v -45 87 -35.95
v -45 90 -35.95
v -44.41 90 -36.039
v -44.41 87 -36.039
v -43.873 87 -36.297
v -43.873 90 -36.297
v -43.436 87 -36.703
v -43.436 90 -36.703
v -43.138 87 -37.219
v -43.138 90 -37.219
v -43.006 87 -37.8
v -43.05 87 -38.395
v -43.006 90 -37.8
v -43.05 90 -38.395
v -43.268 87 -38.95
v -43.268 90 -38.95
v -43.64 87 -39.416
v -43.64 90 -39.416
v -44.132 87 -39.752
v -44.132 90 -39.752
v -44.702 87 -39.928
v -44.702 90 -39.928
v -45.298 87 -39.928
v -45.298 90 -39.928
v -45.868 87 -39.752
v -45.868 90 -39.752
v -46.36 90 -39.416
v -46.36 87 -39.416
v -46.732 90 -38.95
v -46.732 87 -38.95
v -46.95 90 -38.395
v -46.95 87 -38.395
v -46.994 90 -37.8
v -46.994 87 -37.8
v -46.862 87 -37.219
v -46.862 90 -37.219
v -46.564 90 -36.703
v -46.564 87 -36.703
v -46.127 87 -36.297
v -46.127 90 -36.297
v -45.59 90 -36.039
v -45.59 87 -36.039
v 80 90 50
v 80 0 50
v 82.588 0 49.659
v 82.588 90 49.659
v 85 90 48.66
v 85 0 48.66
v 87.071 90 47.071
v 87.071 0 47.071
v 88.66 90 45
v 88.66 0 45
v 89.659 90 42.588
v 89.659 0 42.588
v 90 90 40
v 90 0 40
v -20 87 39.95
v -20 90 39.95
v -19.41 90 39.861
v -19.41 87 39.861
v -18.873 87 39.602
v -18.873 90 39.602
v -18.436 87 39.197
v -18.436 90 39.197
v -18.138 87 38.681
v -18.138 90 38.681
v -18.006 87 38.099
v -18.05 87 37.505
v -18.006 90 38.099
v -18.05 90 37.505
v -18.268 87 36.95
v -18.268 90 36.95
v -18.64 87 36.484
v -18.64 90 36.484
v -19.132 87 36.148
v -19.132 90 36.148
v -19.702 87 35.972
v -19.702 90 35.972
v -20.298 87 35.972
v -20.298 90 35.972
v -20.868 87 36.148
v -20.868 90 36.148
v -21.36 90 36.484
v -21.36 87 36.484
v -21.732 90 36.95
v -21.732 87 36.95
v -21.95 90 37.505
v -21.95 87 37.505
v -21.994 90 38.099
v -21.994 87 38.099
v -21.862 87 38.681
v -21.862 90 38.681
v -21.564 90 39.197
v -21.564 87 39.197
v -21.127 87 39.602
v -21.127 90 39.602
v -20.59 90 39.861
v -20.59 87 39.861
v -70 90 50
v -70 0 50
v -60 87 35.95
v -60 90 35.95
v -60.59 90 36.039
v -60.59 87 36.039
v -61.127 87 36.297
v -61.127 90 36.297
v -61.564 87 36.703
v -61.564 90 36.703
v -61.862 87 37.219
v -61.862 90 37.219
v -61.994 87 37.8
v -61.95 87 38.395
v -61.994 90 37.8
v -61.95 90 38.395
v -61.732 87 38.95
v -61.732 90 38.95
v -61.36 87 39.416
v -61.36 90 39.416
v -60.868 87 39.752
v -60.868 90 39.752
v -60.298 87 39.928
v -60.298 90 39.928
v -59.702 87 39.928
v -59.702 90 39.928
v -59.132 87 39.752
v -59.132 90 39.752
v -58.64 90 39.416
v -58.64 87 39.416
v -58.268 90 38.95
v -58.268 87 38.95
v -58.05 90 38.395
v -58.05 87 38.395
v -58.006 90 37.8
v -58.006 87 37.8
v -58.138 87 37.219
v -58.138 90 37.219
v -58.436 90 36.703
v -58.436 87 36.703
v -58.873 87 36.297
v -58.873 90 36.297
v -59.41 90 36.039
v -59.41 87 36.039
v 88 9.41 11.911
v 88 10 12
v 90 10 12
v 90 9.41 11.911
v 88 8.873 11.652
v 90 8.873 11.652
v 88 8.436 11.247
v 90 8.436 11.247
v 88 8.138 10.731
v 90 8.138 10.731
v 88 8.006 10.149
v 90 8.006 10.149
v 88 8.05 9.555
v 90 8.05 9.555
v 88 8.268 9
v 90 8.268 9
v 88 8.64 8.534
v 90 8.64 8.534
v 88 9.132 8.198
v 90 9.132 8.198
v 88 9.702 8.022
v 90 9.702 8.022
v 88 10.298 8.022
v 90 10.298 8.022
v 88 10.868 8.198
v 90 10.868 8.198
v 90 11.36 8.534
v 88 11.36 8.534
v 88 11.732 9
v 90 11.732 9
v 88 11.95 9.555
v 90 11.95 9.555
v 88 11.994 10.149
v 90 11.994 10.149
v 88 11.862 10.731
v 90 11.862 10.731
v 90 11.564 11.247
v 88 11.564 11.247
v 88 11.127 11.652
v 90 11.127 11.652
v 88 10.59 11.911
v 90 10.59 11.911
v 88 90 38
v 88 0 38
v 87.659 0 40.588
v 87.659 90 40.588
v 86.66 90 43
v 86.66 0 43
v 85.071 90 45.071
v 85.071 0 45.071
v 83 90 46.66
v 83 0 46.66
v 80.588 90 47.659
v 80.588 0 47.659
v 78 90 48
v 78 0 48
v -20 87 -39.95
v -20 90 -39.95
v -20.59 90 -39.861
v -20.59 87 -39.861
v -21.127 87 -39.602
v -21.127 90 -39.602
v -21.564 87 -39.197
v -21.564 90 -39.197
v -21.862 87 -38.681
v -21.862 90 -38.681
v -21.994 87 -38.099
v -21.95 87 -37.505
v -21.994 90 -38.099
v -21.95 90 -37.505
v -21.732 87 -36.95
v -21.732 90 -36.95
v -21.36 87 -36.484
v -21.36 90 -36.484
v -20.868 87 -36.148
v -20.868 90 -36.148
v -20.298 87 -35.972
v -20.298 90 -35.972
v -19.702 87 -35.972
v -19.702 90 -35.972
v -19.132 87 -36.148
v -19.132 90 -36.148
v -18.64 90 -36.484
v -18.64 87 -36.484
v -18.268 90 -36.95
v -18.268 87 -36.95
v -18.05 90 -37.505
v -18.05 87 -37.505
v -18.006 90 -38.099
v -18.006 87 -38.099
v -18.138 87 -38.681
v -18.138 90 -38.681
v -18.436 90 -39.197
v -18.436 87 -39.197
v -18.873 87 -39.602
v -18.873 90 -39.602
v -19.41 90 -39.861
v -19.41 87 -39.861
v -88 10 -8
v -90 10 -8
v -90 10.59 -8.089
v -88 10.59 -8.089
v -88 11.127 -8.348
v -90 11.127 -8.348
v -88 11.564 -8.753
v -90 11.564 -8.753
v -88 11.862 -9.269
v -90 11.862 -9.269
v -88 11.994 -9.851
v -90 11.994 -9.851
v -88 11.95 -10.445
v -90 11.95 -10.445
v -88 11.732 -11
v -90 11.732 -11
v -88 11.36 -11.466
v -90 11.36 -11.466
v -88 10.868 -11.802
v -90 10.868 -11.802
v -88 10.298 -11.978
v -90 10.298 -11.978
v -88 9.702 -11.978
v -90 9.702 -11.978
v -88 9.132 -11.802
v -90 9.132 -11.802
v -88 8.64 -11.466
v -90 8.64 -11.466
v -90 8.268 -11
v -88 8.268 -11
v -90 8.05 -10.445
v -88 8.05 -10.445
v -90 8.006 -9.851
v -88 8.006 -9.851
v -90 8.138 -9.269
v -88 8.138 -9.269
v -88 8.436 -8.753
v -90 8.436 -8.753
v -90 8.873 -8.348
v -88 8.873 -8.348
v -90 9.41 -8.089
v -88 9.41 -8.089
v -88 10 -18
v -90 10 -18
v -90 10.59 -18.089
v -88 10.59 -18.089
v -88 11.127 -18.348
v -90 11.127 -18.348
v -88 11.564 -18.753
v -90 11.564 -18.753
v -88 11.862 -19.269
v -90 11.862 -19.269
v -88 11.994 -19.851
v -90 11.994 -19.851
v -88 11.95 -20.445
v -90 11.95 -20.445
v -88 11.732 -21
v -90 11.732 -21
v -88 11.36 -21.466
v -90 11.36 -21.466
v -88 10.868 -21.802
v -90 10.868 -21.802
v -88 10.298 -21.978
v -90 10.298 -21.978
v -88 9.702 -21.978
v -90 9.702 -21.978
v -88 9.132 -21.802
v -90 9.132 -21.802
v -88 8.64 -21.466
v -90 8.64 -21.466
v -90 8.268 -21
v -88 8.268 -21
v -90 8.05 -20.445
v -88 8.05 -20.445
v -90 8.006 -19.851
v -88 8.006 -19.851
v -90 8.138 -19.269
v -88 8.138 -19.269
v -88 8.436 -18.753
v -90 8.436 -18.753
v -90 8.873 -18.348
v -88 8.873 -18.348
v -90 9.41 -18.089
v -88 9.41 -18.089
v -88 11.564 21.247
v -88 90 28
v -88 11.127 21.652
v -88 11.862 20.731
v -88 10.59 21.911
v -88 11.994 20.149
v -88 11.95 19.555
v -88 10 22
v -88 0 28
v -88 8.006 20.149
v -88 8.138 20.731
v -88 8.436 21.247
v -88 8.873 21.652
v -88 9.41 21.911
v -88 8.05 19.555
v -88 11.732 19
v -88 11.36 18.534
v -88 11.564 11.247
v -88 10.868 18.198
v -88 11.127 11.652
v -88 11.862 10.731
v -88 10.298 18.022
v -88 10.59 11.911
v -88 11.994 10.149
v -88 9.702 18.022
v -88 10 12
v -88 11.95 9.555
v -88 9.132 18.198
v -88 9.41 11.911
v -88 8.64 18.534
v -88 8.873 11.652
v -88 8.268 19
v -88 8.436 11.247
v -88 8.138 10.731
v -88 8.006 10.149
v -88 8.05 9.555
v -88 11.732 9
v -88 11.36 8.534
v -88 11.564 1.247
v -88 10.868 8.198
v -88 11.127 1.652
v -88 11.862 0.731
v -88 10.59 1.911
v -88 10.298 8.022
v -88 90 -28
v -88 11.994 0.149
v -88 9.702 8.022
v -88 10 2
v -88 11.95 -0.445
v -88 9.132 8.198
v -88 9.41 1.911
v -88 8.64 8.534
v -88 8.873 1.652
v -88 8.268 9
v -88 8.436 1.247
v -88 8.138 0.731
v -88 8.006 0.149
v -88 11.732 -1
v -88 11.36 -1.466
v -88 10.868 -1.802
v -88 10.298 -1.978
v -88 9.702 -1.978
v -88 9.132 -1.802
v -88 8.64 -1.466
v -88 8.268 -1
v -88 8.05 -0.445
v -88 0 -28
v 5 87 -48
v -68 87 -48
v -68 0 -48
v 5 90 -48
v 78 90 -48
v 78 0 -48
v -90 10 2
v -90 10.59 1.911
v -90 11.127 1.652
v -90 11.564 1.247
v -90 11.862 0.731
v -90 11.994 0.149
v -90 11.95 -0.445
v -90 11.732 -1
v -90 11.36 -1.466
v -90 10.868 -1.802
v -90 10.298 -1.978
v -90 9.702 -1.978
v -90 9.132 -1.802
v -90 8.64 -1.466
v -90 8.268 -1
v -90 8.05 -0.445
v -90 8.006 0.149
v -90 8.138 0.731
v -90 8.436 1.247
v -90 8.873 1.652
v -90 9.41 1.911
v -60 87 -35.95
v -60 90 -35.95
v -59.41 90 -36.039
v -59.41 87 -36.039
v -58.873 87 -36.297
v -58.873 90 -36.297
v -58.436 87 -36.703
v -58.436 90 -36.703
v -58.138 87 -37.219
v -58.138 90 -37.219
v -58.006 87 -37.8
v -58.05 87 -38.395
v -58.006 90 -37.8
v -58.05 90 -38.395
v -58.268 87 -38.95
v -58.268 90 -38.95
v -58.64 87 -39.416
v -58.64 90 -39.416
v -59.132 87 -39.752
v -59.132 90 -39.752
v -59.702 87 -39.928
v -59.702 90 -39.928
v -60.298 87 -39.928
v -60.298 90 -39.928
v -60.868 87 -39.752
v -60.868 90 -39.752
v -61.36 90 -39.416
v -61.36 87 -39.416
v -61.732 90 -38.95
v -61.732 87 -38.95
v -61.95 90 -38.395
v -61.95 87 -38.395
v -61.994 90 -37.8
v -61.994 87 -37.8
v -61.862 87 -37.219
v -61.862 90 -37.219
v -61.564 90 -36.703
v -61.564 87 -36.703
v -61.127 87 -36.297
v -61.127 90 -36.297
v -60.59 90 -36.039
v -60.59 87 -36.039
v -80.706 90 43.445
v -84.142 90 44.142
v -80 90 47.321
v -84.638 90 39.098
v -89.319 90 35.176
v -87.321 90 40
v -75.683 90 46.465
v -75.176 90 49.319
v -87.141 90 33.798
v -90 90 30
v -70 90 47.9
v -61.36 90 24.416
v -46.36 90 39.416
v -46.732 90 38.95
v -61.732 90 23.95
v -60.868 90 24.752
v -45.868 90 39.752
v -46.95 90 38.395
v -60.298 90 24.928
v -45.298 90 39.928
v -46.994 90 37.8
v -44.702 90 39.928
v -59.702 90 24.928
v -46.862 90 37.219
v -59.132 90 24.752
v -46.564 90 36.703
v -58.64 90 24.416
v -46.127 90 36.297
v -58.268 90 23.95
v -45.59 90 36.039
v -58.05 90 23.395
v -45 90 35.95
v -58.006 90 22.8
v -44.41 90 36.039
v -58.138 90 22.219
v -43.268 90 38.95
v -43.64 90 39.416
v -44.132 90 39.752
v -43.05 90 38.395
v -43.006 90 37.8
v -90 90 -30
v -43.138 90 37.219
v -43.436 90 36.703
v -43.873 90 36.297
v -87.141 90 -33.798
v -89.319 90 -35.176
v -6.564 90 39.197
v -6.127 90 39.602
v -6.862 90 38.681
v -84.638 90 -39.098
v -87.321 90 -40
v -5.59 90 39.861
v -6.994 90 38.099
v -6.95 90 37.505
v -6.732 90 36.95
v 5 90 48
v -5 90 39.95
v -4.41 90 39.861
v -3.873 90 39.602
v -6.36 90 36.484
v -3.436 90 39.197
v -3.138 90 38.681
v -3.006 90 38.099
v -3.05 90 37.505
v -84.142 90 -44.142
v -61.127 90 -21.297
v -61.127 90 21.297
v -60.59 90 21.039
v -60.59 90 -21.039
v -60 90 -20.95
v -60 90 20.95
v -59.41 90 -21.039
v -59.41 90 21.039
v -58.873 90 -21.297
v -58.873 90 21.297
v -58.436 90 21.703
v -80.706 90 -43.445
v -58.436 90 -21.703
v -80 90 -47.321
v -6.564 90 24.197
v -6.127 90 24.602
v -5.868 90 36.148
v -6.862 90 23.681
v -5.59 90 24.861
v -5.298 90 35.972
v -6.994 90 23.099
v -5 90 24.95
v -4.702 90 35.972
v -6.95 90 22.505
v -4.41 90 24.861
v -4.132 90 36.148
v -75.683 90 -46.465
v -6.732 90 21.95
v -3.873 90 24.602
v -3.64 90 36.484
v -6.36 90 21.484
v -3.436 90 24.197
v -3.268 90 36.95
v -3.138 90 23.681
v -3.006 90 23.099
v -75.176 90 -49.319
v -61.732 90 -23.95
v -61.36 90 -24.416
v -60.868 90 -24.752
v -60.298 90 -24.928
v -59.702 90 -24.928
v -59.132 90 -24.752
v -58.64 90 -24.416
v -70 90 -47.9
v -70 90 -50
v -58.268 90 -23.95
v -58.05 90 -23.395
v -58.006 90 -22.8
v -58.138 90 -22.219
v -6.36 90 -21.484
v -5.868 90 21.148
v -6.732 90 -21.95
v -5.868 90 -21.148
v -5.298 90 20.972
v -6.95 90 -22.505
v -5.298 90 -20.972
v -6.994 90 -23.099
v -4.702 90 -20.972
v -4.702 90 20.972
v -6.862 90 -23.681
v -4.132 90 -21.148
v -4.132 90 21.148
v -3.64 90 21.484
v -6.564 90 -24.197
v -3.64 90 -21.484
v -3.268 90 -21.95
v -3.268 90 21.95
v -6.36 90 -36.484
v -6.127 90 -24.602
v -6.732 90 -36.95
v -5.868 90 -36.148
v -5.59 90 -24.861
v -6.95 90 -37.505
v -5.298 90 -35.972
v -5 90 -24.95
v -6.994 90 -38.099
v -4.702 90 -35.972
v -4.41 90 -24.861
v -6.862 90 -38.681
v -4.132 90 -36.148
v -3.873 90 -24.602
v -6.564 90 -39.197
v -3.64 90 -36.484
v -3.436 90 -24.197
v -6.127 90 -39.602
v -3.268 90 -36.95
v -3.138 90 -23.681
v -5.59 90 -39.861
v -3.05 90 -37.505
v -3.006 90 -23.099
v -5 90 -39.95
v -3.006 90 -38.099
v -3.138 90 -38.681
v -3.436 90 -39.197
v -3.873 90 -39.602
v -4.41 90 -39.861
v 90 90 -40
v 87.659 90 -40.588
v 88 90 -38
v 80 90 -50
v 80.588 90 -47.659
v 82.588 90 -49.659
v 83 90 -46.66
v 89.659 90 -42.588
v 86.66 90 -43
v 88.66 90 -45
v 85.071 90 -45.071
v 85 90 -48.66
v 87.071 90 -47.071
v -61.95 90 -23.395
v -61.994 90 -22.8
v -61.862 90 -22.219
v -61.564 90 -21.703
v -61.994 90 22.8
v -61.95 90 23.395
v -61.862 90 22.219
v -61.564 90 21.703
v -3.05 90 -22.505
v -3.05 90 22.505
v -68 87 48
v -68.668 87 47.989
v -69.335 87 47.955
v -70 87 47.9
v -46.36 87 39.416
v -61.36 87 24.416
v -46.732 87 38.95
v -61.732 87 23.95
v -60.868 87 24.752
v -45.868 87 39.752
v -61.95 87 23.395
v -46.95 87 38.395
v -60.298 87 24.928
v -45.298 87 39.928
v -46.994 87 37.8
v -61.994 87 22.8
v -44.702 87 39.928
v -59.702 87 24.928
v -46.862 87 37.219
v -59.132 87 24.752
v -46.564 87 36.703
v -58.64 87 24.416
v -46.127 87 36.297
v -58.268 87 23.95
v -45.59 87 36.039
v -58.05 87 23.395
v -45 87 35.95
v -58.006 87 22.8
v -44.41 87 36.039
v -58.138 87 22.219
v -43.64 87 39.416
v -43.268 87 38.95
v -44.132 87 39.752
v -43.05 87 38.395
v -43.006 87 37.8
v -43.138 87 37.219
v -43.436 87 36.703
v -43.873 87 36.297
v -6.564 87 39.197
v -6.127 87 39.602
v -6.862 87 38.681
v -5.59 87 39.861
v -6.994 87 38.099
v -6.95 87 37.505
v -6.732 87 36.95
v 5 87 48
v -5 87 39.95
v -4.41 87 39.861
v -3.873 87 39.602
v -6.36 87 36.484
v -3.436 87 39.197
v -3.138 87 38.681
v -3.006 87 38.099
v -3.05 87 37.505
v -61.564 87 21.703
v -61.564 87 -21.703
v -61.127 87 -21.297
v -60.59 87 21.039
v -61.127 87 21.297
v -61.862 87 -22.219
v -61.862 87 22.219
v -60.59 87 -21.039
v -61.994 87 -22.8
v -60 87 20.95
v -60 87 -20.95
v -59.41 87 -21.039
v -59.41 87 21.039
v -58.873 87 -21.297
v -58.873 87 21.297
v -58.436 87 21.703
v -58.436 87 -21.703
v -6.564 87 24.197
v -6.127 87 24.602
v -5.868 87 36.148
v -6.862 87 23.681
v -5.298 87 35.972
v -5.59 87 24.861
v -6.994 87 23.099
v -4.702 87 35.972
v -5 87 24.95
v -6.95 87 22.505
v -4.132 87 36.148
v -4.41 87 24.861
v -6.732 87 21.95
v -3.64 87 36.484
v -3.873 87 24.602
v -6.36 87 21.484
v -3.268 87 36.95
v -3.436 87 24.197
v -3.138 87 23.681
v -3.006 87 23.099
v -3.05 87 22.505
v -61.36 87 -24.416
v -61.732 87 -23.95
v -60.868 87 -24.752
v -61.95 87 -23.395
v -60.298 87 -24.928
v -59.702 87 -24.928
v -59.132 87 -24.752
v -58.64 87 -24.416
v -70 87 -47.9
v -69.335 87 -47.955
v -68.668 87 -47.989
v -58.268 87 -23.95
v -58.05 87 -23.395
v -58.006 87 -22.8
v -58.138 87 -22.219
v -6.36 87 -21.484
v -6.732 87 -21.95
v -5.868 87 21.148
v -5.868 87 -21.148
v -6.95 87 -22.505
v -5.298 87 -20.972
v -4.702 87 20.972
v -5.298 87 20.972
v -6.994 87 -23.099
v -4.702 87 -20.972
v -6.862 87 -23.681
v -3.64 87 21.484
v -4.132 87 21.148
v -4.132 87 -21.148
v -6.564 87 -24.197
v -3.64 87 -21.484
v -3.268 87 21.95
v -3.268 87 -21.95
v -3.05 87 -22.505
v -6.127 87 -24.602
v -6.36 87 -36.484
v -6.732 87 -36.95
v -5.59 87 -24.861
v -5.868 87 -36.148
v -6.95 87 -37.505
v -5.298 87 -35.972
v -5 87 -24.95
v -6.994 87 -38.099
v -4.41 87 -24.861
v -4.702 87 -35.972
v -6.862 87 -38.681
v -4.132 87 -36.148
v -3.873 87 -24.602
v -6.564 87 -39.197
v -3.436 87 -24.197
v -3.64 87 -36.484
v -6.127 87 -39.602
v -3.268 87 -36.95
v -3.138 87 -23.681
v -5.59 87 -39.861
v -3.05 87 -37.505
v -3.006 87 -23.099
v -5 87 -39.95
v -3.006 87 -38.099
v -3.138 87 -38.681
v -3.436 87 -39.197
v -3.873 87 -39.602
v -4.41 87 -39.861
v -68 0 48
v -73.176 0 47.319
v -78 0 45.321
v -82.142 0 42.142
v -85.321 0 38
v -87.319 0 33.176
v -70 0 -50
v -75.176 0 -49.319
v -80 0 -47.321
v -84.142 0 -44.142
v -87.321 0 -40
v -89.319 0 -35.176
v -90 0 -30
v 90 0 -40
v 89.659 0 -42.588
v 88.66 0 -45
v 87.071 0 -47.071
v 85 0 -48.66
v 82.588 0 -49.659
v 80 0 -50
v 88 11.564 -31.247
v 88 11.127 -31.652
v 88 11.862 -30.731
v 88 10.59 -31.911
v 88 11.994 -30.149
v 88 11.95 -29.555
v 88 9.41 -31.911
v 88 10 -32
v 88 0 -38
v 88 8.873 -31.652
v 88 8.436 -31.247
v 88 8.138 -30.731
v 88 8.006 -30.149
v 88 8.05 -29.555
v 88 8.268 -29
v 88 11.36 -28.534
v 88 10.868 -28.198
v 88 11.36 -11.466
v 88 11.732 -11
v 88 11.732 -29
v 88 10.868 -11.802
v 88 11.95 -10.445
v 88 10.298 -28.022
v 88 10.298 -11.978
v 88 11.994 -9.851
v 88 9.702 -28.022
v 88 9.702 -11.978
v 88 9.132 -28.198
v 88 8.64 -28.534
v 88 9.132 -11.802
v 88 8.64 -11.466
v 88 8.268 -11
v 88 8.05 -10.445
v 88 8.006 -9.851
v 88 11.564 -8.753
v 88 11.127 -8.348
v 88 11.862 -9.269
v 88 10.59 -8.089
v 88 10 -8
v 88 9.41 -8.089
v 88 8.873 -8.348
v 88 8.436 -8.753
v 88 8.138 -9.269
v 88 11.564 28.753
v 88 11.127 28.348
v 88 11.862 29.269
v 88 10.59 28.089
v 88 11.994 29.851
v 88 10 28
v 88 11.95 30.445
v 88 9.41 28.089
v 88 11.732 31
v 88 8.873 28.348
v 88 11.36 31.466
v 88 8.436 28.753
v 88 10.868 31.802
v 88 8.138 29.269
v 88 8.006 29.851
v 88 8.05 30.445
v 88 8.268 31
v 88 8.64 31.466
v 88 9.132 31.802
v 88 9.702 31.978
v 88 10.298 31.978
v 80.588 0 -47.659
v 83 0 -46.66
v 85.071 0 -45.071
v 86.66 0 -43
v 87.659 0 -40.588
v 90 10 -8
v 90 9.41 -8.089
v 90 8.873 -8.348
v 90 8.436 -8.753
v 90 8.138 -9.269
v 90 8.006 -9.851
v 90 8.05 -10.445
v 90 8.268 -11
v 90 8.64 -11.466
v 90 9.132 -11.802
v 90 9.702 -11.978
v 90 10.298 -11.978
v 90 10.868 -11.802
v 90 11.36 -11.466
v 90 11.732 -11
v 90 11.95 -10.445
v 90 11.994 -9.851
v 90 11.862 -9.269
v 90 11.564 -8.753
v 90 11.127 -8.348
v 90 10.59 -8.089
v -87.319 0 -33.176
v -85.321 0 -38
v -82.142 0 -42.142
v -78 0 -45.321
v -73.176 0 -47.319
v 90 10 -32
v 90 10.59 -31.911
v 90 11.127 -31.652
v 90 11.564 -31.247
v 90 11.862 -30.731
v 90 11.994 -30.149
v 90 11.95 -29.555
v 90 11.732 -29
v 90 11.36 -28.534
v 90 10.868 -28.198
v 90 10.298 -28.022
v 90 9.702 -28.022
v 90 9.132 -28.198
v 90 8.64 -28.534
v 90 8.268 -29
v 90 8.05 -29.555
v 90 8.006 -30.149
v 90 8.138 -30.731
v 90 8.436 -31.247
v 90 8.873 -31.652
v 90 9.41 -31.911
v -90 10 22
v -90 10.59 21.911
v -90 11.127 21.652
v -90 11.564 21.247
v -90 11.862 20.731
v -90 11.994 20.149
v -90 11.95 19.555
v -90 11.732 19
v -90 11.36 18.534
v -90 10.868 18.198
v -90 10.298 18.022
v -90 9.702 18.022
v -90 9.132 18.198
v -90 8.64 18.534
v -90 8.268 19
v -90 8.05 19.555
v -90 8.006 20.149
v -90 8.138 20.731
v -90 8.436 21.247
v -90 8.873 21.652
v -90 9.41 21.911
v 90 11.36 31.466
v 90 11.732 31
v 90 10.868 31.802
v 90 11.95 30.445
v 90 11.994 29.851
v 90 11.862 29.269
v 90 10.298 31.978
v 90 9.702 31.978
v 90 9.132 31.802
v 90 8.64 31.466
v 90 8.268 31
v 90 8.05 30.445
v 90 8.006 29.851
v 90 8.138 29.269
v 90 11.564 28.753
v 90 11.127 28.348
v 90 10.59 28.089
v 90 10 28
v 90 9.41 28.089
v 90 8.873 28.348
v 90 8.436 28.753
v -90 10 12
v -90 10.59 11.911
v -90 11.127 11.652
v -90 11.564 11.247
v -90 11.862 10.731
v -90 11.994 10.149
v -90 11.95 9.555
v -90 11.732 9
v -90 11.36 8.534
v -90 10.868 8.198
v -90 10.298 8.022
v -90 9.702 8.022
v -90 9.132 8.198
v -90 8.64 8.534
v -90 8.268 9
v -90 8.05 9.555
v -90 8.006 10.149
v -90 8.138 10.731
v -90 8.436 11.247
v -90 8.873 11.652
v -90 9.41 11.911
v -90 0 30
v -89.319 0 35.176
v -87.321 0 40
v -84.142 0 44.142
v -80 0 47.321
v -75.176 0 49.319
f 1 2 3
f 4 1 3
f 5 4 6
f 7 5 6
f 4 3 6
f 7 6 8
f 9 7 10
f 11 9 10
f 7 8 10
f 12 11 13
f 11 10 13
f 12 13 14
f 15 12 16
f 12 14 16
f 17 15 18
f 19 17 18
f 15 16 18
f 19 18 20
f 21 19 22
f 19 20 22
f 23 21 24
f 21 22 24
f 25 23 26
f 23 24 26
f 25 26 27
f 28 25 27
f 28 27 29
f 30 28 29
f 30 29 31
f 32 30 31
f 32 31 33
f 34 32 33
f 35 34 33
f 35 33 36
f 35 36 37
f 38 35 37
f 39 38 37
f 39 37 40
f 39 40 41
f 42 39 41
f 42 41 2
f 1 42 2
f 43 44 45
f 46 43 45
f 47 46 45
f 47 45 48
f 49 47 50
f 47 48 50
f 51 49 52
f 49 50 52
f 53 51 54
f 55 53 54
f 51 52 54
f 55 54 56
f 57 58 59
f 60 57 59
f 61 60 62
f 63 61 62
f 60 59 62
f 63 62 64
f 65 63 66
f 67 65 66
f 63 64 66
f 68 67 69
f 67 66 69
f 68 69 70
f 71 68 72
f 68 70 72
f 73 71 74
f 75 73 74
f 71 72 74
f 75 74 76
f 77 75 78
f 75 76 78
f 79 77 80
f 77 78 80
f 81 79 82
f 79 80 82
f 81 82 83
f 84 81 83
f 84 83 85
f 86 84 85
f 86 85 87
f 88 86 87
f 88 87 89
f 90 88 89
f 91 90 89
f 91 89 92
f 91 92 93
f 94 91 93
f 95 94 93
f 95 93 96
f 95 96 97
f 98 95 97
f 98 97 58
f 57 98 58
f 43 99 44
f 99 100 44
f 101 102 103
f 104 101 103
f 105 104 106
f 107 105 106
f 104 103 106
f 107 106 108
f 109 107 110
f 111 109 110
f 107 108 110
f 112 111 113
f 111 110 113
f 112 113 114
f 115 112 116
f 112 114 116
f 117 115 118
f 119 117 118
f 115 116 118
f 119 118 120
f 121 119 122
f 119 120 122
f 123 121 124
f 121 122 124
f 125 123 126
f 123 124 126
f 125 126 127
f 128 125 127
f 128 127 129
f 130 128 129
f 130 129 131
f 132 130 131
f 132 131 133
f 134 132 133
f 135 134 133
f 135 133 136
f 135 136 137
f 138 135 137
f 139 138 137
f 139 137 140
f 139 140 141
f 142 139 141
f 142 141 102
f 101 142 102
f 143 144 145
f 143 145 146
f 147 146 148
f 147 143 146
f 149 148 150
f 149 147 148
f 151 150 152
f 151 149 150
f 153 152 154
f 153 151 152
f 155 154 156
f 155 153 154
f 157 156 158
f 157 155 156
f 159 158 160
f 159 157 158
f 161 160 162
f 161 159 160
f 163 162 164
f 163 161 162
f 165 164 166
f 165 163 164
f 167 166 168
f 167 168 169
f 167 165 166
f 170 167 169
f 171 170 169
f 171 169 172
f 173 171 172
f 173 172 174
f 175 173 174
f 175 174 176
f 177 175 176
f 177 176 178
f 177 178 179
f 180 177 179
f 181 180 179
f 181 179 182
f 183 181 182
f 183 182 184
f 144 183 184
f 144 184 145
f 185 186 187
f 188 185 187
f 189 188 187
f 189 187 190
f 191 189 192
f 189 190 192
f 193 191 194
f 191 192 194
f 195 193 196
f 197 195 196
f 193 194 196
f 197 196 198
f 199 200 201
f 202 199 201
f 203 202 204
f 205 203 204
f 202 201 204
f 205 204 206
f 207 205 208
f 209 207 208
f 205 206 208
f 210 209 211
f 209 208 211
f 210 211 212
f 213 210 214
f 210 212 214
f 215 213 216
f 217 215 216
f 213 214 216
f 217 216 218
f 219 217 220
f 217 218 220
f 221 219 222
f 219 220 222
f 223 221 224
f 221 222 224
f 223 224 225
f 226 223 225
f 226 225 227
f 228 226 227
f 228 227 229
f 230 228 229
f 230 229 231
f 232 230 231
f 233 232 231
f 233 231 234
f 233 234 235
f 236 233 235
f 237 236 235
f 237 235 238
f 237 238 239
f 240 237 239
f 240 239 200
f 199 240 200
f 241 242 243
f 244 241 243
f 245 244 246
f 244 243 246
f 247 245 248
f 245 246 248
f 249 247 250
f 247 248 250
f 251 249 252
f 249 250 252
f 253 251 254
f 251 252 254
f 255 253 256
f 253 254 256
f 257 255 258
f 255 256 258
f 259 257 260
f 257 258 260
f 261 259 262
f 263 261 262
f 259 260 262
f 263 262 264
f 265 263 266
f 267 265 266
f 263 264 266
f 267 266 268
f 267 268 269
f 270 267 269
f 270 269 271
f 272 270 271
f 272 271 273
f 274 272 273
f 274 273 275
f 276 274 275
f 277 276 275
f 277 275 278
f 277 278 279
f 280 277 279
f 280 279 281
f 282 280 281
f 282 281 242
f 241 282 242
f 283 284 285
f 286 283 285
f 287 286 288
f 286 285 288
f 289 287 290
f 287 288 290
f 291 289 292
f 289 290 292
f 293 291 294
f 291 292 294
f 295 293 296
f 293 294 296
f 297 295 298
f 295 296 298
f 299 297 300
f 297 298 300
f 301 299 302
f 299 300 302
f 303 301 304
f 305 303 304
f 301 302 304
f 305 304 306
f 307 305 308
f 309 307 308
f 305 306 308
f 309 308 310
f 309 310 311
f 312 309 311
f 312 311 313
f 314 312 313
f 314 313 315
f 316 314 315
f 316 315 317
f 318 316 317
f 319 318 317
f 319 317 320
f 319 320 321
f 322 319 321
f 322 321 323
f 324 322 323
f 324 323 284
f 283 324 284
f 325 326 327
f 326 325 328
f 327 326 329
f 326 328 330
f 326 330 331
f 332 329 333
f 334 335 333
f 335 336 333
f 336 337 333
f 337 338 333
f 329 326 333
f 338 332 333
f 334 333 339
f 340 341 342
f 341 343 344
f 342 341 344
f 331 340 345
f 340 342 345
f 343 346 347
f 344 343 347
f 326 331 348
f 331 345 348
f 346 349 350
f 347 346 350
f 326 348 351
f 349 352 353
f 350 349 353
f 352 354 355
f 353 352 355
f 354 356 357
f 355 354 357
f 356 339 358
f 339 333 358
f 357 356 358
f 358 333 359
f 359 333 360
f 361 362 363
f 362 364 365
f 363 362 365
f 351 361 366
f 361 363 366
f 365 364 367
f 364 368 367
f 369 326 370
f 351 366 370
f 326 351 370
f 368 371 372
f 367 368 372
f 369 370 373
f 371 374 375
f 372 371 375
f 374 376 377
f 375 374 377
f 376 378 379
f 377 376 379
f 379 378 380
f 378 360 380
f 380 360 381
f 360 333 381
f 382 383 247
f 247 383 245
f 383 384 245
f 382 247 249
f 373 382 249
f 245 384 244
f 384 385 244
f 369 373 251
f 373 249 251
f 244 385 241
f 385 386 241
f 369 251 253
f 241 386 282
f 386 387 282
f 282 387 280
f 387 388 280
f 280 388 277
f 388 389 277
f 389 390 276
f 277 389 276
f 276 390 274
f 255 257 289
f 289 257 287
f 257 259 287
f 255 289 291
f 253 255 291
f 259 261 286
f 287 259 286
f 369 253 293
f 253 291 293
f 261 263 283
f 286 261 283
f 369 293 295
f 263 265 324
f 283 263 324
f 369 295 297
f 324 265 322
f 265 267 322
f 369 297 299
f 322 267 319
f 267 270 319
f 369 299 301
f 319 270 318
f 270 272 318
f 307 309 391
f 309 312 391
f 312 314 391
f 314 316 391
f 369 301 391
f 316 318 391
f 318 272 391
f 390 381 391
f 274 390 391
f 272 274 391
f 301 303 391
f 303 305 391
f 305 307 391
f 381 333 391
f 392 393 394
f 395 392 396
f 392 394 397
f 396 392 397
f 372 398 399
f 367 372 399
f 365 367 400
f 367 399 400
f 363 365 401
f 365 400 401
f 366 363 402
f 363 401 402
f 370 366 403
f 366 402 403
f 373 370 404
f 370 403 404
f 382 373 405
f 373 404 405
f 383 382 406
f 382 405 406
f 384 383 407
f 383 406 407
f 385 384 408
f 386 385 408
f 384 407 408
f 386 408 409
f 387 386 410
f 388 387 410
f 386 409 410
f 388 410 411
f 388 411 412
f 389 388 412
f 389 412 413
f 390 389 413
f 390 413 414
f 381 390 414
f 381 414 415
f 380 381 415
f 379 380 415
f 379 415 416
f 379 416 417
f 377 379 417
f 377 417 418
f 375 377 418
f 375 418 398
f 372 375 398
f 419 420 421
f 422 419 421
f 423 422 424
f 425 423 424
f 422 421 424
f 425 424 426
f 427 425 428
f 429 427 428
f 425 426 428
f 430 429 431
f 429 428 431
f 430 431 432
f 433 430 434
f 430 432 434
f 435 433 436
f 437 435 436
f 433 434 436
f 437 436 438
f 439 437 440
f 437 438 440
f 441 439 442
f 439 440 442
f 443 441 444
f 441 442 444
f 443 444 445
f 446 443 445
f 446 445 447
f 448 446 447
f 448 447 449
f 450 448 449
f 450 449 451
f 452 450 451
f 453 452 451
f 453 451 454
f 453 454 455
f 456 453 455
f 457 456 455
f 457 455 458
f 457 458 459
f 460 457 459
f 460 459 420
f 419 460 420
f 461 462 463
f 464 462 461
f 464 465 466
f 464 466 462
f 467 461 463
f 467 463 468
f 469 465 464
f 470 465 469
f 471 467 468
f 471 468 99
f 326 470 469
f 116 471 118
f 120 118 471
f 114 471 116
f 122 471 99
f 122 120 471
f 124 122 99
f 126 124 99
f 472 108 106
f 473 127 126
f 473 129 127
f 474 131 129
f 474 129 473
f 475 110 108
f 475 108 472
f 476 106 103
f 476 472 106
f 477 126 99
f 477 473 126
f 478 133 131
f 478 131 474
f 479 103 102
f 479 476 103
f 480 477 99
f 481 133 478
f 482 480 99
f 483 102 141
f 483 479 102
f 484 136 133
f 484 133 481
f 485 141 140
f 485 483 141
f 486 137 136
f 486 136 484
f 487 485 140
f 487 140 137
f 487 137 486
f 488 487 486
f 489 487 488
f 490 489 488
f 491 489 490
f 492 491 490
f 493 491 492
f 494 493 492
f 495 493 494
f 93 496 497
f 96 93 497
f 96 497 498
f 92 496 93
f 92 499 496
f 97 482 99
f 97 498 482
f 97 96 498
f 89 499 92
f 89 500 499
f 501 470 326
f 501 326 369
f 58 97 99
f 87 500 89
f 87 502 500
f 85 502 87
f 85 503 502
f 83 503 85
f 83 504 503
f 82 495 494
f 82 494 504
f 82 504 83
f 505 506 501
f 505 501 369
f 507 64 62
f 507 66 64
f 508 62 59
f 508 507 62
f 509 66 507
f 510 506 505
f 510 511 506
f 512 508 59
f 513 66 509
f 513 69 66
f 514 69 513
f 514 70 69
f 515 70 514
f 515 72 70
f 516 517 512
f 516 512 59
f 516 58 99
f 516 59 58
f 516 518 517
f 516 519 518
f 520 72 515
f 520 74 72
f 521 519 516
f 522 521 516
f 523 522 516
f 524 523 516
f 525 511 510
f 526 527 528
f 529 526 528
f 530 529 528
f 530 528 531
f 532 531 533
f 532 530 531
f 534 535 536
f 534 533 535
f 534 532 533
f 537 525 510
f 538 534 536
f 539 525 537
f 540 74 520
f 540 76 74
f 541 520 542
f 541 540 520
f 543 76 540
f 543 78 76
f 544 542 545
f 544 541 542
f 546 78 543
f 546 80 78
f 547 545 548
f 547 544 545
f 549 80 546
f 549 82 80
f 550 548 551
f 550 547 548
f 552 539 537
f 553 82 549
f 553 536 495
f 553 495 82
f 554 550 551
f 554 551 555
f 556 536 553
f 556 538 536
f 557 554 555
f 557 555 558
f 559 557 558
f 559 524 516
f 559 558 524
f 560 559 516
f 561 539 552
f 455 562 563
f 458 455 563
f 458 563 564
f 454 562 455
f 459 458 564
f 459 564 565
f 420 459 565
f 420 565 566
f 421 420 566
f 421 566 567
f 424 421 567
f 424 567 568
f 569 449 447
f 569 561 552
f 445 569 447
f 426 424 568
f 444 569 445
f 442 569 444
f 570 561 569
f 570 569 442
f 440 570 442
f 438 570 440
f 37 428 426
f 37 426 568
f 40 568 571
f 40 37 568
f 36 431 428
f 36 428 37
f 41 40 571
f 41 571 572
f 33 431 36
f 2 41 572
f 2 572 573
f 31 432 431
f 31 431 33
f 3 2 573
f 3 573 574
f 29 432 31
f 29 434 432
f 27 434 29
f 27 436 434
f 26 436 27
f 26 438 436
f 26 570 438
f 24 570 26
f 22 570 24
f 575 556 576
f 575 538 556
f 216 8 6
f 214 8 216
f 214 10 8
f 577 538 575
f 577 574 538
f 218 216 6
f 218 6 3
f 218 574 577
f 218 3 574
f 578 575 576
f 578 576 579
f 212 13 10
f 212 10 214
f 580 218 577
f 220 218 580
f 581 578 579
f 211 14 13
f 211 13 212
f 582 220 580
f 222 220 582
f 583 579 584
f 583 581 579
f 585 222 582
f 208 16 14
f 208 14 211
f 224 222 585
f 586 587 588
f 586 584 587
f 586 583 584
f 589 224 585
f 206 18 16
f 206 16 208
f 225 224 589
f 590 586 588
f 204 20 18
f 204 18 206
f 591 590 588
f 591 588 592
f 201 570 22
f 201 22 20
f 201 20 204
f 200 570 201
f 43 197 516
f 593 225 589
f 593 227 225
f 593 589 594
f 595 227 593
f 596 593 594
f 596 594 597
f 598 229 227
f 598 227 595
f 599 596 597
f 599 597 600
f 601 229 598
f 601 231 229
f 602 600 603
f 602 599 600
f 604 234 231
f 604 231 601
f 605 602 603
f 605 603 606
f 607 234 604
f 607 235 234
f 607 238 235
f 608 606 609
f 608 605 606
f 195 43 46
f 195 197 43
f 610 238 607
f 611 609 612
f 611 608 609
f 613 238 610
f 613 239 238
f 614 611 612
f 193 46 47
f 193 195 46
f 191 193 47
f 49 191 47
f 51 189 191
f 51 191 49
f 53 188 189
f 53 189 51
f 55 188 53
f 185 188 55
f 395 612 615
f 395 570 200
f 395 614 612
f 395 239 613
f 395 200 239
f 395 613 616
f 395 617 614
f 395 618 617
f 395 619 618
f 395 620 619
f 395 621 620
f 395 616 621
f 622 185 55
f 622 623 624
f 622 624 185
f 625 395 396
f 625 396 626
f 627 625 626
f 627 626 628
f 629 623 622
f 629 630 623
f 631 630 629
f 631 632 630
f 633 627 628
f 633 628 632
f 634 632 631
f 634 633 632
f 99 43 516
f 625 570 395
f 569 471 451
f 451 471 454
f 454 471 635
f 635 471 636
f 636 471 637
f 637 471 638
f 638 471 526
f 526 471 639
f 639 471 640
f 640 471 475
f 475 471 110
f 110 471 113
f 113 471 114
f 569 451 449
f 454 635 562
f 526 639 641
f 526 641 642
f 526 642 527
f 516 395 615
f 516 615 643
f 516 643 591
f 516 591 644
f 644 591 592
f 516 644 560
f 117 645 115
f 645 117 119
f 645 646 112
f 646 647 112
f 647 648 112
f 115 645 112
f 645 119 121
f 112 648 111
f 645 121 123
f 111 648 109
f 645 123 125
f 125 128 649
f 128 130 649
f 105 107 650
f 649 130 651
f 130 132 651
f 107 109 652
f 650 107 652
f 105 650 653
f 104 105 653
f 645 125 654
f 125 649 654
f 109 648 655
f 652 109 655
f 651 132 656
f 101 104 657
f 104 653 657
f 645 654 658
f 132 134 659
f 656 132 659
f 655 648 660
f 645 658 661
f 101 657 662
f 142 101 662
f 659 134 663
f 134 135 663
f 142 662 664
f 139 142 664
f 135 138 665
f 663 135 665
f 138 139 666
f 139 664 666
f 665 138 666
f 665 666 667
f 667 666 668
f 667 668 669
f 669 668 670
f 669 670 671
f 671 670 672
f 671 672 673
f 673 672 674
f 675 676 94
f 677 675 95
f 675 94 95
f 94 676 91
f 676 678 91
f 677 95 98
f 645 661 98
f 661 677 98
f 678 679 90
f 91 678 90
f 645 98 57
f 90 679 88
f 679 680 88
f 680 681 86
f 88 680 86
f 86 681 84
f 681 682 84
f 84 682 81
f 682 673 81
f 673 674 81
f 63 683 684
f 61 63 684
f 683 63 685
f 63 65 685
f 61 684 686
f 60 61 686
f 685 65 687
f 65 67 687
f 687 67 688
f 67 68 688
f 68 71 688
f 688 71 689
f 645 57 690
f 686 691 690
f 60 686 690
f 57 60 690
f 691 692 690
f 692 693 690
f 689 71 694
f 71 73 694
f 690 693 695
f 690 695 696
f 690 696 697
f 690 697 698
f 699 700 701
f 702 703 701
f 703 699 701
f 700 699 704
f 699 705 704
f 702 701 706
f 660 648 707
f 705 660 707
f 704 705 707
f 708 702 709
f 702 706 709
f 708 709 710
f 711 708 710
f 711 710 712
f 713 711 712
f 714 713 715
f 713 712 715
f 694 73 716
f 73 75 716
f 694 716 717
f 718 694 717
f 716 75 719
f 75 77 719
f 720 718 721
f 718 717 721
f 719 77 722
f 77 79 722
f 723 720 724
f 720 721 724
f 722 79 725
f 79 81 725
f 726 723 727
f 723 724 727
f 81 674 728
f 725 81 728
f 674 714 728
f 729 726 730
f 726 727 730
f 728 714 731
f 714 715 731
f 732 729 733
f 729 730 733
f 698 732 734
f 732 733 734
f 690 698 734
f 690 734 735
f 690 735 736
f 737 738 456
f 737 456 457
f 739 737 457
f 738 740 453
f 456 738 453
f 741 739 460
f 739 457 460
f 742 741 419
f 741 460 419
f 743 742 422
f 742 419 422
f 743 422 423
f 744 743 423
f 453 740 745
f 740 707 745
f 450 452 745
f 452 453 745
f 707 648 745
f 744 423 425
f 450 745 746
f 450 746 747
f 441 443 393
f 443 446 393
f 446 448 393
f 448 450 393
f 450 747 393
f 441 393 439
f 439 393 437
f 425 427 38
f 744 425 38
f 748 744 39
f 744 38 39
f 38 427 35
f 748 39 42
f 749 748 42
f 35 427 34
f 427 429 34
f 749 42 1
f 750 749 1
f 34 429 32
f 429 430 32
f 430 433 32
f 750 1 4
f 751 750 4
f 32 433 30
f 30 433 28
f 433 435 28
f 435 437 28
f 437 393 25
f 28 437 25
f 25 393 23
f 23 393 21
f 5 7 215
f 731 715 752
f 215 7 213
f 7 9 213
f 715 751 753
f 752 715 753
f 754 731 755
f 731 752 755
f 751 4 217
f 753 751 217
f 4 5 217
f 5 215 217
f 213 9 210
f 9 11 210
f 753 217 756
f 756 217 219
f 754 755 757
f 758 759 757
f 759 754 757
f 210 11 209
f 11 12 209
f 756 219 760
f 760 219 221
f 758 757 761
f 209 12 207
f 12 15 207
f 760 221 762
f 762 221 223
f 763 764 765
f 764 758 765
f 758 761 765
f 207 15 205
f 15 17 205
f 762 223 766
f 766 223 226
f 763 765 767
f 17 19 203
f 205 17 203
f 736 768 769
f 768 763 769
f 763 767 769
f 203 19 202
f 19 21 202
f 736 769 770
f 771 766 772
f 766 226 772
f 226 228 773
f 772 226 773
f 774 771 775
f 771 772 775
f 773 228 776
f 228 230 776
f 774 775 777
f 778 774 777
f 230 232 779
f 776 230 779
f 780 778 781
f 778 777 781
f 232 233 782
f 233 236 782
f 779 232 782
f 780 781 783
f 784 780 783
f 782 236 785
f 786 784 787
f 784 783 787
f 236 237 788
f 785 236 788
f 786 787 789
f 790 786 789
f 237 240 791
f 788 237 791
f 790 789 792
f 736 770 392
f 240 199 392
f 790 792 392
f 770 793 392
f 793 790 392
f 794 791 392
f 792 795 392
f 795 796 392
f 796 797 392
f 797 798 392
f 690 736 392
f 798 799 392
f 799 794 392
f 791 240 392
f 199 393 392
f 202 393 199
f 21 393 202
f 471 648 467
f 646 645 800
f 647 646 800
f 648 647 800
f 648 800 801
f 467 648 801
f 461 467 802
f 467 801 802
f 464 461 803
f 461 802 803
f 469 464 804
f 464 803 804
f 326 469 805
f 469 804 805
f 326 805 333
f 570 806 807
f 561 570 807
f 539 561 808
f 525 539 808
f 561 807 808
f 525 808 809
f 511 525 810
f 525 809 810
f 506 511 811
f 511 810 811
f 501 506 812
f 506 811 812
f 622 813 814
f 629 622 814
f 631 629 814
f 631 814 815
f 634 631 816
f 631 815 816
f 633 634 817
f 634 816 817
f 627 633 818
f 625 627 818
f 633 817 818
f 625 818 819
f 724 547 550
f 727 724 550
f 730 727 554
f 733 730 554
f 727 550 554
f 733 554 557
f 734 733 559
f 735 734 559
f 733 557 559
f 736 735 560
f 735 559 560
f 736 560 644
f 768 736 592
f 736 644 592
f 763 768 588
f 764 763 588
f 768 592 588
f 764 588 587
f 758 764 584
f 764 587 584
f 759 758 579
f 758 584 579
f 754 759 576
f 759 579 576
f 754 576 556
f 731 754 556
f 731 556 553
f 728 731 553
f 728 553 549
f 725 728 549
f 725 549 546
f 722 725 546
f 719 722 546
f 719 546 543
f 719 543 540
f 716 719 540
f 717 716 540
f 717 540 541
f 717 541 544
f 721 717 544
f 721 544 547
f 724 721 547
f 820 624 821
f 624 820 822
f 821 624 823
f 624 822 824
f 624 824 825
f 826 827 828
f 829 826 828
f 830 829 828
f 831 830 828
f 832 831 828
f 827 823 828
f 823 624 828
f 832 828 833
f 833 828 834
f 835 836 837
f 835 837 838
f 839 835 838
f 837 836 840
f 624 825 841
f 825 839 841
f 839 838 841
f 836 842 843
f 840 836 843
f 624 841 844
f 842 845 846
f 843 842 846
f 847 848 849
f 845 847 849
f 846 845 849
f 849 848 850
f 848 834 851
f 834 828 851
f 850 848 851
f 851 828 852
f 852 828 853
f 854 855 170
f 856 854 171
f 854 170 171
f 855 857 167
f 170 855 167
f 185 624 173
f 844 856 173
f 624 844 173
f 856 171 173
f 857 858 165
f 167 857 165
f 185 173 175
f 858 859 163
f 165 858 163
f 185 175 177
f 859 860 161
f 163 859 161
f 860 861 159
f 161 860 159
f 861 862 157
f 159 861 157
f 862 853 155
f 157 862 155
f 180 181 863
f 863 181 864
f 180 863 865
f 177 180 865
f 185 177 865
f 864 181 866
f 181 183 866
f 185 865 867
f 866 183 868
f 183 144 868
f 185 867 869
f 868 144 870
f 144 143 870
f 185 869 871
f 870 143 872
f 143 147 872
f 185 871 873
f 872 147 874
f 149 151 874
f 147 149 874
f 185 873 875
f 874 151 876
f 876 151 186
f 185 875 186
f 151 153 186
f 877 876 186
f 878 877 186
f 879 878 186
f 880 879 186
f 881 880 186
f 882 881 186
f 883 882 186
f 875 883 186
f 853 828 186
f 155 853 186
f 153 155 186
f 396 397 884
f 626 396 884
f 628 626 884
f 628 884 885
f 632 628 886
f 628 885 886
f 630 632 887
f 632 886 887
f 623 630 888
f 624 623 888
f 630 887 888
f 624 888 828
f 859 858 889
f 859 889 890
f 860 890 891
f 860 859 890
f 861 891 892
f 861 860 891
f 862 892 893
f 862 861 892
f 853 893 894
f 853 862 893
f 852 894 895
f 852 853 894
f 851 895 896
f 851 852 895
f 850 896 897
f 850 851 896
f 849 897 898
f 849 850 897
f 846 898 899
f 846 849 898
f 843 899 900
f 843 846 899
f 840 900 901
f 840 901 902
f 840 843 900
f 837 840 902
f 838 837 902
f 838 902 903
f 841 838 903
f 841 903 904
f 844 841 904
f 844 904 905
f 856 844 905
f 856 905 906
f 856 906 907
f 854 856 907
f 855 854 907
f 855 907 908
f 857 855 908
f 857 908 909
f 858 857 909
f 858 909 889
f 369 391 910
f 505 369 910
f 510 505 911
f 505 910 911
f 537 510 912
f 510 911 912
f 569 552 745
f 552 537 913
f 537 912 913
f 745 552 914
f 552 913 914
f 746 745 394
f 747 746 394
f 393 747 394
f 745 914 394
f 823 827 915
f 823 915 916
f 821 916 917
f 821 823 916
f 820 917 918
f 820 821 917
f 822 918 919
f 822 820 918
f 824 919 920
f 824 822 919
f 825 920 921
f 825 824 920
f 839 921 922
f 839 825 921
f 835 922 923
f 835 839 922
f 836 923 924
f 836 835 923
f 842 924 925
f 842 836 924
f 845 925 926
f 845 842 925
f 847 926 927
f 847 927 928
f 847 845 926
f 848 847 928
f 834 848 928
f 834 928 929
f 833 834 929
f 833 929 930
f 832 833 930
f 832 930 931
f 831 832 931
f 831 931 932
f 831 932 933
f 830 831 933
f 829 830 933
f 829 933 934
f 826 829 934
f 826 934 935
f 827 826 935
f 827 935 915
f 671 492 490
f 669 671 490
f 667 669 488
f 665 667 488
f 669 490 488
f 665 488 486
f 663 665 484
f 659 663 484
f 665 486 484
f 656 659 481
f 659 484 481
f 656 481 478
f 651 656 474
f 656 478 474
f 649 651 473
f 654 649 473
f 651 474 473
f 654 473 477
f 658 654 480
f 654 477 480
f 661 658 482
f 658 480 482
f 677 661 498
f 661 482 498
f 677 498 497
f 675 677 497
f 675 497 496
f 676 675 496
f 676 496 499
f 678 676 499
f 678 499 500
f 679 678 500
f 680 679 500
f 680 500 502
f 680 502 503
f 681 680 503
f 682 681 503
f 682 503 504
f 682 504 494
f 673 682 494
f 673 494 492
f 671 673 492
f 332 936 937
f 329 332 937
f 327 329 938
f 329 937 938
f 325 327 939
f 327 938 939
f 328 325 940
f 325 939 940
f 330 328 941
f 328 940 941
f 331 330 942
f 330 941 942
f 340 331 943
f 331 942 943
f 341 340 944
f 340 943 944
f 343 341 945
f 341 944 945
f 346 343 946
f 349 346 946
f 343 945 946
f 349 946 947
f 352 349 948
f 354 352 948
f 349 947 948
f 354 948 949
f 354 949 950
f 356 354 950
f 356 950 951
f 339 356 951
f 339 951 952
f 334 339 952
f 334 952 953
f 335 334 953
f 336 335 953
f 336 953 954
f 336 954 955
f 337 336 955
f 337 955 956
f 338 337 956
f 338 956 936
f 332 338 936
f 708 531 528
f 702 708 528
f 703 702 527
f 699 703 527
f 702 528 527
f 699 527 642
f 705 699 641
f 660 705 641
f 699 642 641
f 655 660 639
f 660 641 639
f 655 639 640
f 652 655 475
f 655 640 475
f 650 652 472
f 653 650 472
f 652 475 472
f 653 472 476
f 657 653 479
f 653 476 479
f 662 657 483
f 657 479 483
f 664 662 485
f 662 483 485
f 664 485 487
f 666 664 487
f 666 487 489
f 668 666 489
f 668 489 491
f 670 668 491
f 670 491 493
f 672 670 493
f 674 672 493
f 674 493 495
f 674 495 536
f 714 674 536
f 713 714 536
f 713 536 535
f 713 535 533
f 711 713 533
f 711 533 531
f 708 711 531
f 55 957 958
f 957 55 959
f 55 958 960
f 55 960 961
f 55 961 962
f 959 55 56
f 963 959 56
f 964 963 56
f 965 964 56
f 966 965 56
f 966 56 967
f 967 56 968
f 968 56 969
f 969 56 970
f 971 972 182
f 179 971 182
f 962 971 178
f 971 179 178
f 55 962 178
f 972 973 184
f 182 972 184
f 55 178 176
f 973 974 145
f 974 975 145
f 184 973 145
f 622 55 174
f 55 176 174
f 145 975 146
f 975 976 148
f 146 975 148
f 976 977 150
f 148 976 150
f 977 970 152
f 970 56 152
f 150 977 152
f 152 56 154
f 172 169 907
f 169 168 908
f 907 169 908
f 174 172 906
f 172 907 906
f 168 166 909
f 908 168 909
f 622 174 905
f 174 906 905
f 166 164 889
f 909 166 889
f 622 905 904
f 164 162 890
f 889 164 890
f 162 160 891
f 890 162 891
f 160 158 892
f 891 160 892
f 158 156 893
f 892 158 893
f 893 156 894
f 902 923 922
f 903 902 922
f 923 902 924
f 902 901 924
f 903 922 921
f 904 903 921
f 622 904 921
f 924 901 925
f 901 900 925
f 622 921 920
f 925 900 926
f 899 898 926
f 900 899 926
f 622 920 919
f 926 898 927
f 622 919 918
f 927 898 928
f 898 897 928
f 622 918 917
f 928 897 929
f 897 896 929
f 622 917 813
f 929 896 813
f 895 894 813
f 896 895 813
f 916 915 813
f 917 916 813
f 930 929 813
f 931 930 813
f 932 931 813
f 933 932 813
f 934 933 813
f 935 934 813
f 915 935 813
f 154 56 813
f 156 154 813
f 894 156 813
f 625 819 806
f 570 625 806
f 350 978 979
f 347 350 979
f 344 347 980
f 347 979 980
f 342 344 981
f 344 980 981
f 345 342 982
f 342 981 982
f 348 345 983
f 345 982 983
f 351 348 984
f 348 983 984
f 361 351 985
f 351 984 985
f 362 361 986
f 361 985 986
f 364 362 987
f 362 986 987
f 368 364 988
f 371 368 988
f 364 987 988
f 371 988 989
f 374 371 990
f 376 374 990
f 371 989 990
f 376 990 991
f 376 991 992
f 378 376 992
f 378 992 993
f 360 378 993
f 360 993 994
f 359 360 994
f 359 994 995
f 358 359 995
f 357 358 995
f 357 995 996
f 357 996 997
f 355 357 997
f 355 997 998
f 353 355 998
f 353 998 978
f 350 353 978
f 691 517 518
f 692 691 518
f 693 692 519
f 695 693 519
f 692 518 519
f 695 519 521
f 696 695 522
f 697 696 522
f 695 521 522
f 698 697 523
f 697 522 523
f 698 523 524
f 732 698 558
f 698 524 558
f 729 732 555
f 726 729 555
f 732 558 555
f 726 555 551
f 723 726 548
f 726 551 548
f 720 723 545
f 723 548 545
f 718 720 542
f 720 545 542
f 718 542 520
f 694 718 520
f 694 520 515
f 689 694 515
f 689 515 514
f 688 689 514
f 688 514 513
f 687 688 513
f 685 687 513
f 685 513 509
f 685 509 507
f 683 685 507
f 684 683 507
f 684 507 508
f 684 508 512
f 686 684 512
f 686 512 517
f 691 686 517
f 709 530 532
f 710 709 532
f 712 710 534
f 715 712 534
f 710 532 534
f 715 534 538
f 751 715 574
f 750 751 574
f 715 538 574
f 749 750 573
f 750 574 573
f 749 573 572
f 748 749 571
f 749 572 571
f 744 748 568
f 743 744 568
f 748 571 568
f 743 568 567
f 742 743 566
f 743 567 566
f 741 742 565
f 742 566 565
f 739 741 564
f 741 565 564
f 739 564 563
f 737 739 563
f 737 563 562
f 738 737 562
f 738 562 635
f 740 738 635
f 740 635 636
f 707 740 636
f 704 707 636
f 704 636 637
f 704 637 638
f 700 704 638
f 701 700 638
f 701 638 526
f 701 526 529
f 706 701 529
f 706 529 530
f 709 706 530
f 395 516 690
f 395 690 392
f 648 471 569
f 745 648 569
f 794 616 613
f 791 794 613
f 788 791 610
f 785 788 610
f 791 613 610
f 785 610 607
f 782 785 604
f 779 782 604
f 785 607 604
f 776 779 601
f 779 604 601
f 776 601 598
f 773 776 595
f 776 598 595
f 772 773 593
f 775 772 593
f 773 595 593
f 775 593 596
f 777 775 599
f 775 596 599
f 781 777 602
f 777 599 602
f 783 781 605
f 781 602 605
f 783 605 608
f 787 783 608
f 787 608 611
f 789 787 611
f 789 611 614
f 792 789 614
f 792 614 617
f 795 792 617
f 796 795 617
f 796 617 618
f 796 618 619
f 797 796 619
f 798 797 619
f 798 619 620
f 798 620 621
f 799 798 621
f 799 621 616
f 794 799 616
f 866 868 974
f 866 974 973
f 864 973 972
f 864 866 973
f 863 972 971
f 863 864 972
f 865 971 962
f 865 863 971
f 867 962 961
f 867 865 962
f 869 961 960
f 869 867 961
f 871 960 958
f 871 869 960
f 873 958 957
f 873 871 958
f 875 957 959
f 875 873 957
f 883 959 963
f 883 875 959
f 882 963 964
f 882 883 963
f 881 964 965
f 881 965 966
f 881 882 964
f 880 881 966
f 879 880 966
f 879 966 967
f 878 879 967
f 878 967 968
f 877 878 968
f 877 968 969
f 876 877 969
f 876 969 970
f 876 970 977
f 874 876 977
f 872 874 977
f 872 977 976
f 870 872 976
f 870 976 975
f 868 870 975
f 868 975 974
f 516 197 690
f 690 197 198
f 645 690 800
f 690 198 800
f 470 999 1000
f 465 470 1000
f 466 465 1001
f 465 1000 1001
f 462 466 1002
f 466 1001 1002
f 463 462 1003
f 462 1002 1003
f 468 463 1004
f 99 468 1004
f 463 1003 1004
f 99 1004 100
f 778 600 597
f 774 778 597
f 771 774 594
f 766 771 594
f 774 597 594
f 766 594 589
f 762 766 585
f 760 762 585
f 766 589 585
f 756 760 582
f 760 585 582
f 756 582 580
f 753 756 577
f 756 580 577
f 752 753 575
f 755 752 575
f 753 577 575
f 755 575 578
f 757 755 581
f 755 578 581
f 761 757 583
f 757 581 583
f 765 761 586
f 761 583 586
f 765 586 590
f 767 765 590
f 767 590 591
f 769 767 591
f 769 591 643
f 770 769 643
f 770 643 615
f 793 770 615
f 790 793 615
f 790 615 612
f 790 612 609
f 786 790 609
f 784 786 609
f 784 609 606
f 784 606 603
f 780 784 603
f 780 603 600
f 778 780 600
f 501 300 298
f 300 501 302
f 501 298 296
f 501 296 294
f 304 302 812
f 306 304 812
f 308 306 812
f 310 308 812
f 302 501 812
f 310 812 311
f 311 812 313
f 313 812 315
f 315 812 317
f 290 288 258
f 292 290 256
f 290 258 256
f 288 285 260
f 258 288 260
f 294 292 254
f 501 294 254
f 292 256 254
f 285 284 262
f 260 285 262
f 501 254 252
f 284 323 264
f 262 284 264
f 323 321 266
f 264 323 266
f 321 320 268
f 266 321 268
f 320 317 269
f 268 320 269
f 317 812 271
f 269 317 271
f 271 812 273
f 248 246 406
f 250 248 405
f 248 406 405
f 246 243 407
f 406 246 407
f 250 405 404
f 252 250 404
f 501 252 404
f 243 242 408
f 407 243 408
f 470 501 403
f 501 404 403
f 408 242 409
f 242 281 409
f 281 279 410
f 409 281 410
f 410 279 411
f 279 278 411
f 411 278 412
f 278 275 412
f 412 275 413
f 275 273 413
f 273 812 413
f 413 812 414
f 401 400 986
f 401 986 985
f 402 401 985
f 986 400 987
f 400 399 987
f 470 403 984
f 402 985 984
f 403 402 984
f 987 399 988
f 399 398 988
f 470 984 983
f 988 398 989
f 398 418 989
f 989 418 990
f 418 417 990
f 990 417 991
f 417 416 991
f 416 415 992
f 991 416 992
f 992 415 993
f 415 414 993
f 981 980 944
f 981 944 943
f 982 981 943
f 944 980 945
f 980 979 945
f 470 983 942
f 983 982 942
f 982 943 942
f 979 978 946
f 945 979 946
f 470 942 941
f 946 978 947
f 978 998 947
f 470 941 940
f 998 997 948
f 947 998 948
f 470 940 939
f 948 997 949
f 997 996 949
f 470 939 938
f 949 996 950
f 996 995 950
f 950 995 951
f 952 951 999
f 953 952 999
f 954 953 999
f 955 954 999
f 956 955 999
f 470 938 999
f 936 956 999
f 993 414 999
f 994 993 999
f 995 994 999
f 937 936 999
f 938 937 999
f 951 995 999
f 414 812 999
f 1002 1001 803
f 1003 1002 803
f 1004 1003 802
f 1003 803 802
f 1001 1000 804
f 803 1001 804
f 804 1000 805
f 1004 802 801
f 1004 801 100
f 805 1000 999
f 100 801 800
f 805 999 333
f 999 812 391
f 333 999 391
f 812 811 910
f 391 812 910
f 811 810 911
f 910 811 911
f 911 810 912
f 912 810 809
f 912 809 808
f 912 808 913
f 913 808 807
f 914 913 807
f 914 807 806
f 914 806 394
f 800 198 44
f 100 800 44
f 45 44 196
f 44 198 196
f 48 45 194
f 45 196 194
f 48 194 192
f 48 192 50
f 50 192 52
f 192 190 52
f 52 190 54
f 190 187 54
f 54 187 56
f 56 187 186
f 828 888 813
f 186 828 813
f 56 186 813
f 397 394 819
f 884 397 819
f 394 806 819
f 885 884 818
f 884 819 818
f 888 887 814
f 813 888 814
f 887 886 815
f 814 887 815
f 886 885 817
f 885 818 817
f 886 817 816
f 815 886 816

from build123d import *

# Parameters (mm, degrees)
Y_KSEKLIK_EKSTR_ZYON1_DEPTH = 90
IZIM2_W                     = 75
IZIM2_H                     = 100
Y_KSEKLIK_EKSTR_ZYON2_DEPTH = 3
IZIM3_R                     = 2
KES_EKSTR_ZYON1_DEPTH       = 10
IZIM4_R                     = 2
KES_EKSTR_ZYON2_DEPTH       = 10
KES_EKSTR_ZYON3_START       = -10
IZIM5_R                     = 2
KES_EKSTR_ZYON3_DEPTH       = 10


with BuildPart() as part:
    # Çizim1 → Yükseklik-Ekstrüzyon1 (new body)
    with BuildSketch(Plane(origin=(0, 0, 0), x_dir=(1, 0, 0), z_dir=(0, 1, 0))):
        with BuildLine():
            Line((-70, -50), (80, -50))
            ThreePointArc((80, -50), (87.071067812, -47.071067812), (90, -40))
            Line((90, -40), (90, 40))
            ThreePointArc((90, 40), (87.071067812, 47.071067812), (80, 50))
            Line((80, 50), (-70, 50))
            ThreePointArc((-70, 50), (-84.142135624, 44.142135624), (-90, 30))
            Line((-90, 30), (-90, -30))
            ThreePointArc((-90, -30), (-84.142135624, -44.142135624), (-70, -50))
        make_face()
        with BuildLine():
            Line((0, 48), (78, 48))
            ThreePointArc((78, 48), (85.071067812, 45.071067812), (88, 38))
            Line((88, 38), (88, 0))
            Line((88, 0), (88, -38))
            ThreePointArc((88, -38), (85.071067812, -45.071067812), (78, -48))
            Line((78, -48), (-68, -48))
            ThreePointArc((-68, -48), (-82.142135624, -42.142135624), (-88, -28))
            Line((-88, -28), (-88, 28))
            ThreePointArc((-88, 28), (-82.142135624, 42.142135624), (-68, 48))
            Line((-68, 48), (0, 48))
        make_face(mode=Mode.SUBTRACT)
    extrude(amount=Y_KSEKLIK_EKSTR_ZYON1_DEPTH)

    # Çizim2 → Yükseklik-Ekstrüzyon2 (add)
    with BuildSketch(Plane(origin=(0, 90, 0), x_dir=(1, 0, 0), z_dir=(0, 1, 0))):
        with Locations((-32.5, 0)):
            Rectangle(IZIM2_W, IZIM2_H)
    extrude(amount=-Y_KSEKLIK_EKSTR_ZYON2_DEPTH)

    # Çizim3 → Kes-Ekstrüzyon1 (cut)
    with BuildSketch(Plane.ZY.offset(90)):
        with Locations((-20, 10)):
            Circle(IZIM3_R)
        with Locations((-10, 10)):
            Circle(IZIM3_R)
        with Locations((0, 10)):
            Circle(IZIM3_R)
        with Locations((10, 10)):
            Circle(IZIM3_R)
        with Locations((20, 10)):
            Circle(IZIM3_R)
    extrude(amount=-KES_EKSTR_ZYON1_DEPTH, mode=Mode.SUBTRACT)

    # Çizim4 → Kes-Ekstrüzyon2 (cut)
    with BuildSketch(Plane(origin=(0, 90, 0), x_dir=(1, 0, 0), z_dir=(0, 1, 0))):
        with Locations(Location((-60, 37.949874371, 0), (0, 0, 270))):
            Circle(IZIM4_R)
        with Locations(Location((-45, 37.949874371, 0), (0, 0, 270))):
            Circle(IZIM4_R)
        with Locations(Location((-60, 22.949874371, 0), (0, 0, 270))):
            Circle(IZIM4_R)
        with Locations(Location((-5, 22.949874371, 0), (0, 0, 90))):
            Circle(IZIM4_R)
        with Locations(Location((-20, 37.949874371, 0), (0, 0, 90))):
            Circle(IZIM4_R)
        with Locations(Location((-5, 37.949874371, 0), (0, 0, 90))):
            Circle(IZIM4_R)
        with Locations(Location((-5, -37.949874371, 0), (0, 0, 270))):
            Circle(IZIM4_R)
        with Locations(Location((-20, -37.949874371, 0), (0, 0, 270))):
            Circle(IZIM4_R)
        with Locations(Location((-5, -22.949874371, 0), (0, 0, 270))):
            Circle(IZIM4_R)
        with Locations(Location((-60, -22.949874371, 0), (0, 0, 90))):
            Circle(IZIM4_R)
        with Locations(Location((-45, -37.949874371, 0), (0, 0, 90))):
            Circle(IZIM4_R)
        with Locations(Location((-60, -37.949874371, 0), (0, 0, 90))):
            Circle(IZIM4_R)
    extrude(amount=-KES_EKSTR_ZYON2_DEPTH, mode=Mode.SUBTRACT)

    # Çizim5 → Kes-Ekstrüzyon3 (cut)
    with BuildSketch(Plane(origin=(90, 0, 0), x_dir=(0, 0, -1), z_dir=(1, 0, 0)).offset(KES_EKSTR_ZYON3_START)):
        with Locations((-30, 10)):
            Circle(IZIM5_R)
        with Locations(Location((-10, 10, 0), (0, 0, 180))):
            Circle(IZIM5_R)
        with Locations(Location((10, 10, 0), (0, 0, 180))):
            Circle(IZIM5_R)
        with Locations((30, 10)):
            Circle(IZIM5_R)
    extrude(amount=KES_EKSTR_ZYON3_DEPTH, mode=Mode.SUBTRACT)


solid = part.part
